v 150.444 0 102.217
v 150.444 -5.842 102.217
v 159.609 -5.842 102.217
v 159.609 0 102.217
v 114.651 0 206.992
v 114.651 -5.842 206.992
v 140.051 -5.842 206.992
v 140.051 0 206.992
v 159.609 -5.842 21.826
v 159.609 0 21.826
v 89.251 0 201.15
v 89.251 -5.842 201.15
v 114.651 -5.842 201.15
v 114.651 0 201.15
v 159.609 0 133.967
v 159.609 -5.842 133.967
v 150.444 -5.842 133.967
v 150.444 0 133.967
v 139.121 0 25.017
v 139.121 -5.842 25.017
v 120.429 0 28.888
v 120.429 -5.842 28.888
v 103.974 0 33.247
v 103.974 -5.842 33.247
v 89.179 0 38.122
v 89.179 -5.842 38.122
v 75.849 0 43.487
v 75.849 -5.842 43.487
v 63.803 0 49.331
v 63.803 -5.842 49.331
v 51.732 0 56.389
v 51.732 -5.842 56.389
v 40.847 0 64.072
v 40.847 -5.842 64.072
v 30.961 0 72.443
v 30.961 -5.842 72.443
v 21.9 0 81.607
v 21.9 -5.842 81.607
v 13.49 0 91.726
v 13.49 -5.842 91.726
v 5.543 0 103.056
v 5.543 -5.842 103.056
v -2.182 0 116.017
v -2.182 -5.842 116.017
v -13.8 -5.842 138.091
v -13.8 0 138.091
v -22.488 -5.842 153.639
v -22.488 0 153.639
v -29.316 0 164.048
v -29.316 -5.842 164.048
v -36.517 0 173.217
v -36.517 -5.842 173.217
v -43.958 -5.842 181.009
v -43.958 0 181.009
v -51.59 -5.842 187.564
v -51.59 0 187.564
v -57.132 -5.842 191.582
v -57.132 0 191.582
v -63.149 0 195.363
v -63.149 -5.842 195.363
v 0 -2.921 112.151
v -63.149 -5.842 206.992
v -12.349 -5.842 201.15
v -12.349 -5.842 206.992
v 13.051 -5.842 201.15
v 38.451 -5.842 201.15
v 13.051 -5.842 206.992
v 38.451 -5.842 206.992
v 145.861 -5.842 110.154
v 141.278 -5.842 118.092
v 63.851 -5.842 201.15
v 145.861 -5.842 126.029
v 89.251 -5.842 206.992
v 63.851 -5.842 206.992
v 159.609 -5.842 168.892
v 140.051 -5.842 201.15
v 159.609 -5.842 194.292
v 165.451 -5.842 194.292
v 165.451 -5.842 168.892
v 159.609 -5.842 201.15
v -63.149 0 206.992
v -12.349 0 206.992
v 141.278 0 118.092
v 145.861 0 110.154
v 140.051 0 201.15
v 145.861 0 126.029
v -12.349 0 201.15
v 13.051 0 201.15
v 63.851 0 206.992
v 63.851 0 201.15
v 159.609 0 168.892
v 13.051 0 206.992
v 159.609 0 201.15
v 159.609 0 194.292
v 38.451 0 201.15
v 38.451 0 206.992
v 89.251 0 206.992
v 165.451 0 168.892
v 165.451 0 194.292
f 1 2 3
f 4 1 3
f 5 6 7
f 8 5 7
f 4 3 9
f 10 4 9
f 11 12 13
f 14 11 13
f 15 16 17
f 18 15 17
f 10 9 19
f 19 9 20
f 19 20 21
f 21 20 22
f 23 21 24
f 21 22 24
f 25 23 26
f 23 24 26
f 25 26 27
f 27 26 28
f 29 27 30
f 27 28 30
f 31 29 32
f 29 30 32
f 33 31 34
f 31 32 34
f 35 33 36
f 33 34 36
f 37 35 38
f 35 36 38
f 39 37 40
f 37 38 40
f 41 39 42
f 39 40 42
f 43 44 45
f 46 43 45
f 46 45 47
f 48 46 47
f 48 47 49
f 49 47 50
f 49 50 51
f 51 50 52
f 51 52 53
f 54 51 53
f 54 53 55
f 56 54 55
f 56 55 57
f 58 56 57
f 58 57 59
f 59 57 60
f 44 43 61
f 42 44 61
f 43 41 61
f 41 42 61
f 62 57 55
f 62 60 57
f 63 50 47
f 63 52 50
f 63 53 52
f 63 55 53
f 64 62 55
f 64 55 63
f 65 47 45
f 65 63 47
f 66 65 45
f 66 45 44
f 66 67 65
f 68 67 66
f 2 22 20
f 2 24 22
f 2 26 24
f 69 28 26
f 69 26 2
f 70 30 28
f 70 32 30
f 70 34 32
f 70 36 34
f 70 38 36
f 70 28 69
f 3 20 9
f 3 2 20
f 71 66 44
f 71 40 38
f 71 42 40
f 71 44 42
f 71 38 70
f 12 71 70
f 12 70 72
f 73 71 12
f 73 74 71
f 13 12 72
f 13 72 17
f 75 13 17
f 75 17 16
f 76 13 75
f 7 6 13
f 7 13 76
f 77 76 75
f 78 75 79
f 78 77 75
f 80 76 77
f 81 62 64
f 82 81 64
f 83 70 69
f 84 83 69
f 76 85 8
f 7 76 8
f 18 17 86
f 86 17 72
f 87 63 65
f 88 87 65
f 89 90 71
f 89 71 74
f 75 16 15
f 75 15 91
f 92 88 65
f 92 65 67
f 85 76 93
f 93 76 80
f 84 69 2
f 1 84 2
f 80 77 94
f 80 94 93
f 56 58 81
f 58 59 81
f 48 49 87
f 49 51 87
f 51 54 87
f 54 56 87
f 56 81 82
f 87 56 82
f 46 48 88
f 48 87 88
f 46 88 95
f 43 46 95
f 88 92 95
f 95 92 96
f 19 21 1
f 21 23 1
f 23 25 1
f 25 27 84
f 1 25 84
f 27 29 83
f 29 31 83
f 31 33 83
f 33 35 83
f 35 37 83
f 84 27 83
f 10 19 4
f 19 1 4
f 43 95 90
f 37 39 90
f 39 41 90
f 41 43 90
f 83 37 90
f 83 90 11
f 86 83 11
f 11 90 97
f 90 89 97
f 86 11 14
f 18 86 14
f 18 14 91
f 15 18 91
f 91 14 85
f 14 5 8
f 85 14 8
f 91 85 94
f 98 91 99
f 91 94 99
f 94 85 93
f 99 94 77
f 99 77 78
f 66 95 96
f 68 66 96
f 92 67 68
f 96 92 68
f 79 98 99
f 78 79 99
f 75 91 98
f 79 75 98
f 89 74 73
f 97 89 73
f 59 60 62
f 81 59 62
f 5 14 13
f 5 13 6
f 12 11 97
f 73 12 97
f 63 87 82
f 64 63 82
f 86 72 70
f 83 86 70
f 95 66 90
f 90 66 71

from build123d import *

# Parameters (mm, degrees)
F0_W      = 279.4
F0_H      = 330.2
F1_DEPTH  = 5.842
F2_W      = 25.4
F2_H      = 5.842
F2_W_2    = 76.2
F2_W_3    = 5.842
F2_H_2    = 25.4
F2_H_3    = 38.1
F3_DEPTH  = 5.842
F5_W      = 5.842
F5_H      = 12.7
F6_DEPTH  = 5.842
F7_DEPTH  = 5.842
F8_W      = 5.842
F8_H      = 25.4
F8_H_2    = 48.641
F8_H_3    = 34.925
F8_H_4    = 11.684
F9_DEPTH  = 5.842
F10_W     = 246.7240431406
F10_H     = 1.016
F11_DEPTH = 5.842
F13_W     = 25.4
F13_H     = 5.842
F13_W_2   = 19.558
F14_DEPTH = 5.842


# Not quite as in the source:
# - a feature names something its author has since deleted; it is built from what else it names


with BuildPart() as f1:
    # F0 (on Front) → F1 (new body)
    with BuildSketch(Plane.XZ):
        with Locations((25.751306051, 40.8756073241)):
            Rectangle(F0_W, F0_H)
    extrude(amount=F1_DEPTH)

    # F2 (on face) → F3 (cut, through all)
    with BuildSketch(Plane.XZ.offset(5.842)):
        with Locations((152.751306051, -121.3033926759)):
            Rectangle(F2_W, F2_H)
        with Locations((101.951306051, -121.3033926759)):
            Rectangle(F2_W, F2_H)
        with Locations((51.151306051, -121.3033926759)):
            Rectangle(F2_W, F2_H)
        with Locations((0.351306051, -121.3033926759)):
            Rectangle(F2_W, F2_H)
        with Locations((-75.848693949, -121.3033926759)):
            Rectangle(F2_W_2, F2_H)
        with Locations((162.530306051, -86.1243926759)):
            Rectangle(F2_W_3, F2_H_2)
        with Locations((162.530306051, -28.9743926759)):
            Rectangle(F2_W_3, F2_H_3)
        with Locations((-111.027693949, -86.1243926759)):
            Rectangle(F2_W_3, F2_H_2)
        with Locations((-111.027693949, -35.3243926759)):
            Rectangle(F2_W_3, F2_H_2)
        with Locations((-111.027693949, 15.4756073241)):
            Rectangle(F2_W_3, F2_H_2)
        with Locations((-111.027693949, 66.2756073241)):
            Rectangle(F2_W_3, F2_H_2)
        with Locations((-111.027693949, 167.8756073241)):
            Rectangle(F2_W_3, F2_H_2)
        with Locations((-111.027693949, 117.0756073241)):
            Rectangle(F2_W_3, F2_H_2)
    extrude(amount=-F3_DEPTH, mode=Mode.SUBTRACT)

    # F5 (on face) → F6 (cut, through all)
    with BuildSketch(Plane.XZ.offset(5.842)):
        with Locations((162.530306051, 2.7756073241)):
            Rectangle(F5_W, F5_H)
    extrude(amount=-F6_DEPTH, mode=Mode.SUBTRACT)

    # F4 (on face) → F7 (cut, through all)
    with BuildSketch(Plane.XZ.offset(5.842)):
        with BuildLine():
            Line((165.451306051, 15.4756073241), (159.609306051, 15.4756073241))
            add(Edge.make_bspline(
                [(159.609306051, 15.4756073241), (73.376306051, 28.1756073241), (-24.3765935073, 60.3637718481), (-21.873693949, 193.2756073241), (-113.948693949, 205.9756073241)],
                knots=[0, 0, 0, 0, 0.507272, 1, 1, 1, 1], degree=3))
            Line((-113.948693949, 205.9756073241), (-113.948693949, 180.5756073241))
            Line((-113.948693949, 180.5756073241), (-108.106693949, 180.5756073241))
            Line((-108.106693949, 180.5756073241), (-108.106693949, 155.1756073241))
            Line((-108.106693949, 155.1756073241), (-113.948693949, 155.1756073241))
            Line((-113.948693949, 155.1756073241), (-113.948693949, 129.7756073241))
            Line((-113.948693949, 129.7756073241), (-108.106693949, 129.7756073241))
            Line((-108.106693949, 129.7756073241), (-108.106693949, 104.3756073241))
            Line((-108.106693949, 104.3756073241), (-113.948693949, 104.3756073241))
            Line((-113.948693949, 104.3756073241), (-113.948693949, 78.9756073241))
            Line((-113.948693949, 78.9756073241), (-108.106693949, 78.9756073241))
            Line((-108.106693949, 78.9756073241), (-108.106693949, 53.5756073241))
            Line((-108.106693949, 53.5756073241), (-113.948693949, 53.5756073241))
            Line((-113.948693949, 53.5756073241), (-113.948693949, 28.1756073241))
            Line((-113.948693949, 28.1756073241), (-108.106693949, 28.1756073241))
            Line((-108.106693949, 28.1756073241), (-108.106693949, 2.7756073241))
            Line((-108.106693949, 2.7756073241), (-113.948693949, 2.7756073241))
            Line((-113.948693949, 2.7756073241), (-113.948693949, -22.6243926759))
            Line((-113.948693949, -22.6243926759), (-108.106693949, -22.6243926759))
            Line((-108.106693949, -22.6243926759), (-108.106693949, -48.0243926759))
            Line((-108.106693949, -48.0243926759), (-113.948693949, -48.0243926759))
            Line((-113.948693949, -48.0243926759), (-113.948693949, -73.4243926759))
            Line((-113.948693949, -73.4243926759), (-108.106693949, -73.4243926759))
            Line((-108.106693949, -73.4243926759), (-108.106693949, -98.8243926759))
            Line((-108.106693949, -98.8243926759), (-113.948693949, -98.8243926759))
            Line((-113.948693949, -98.8243926759), (-113.948693949, -118.3823926759))
            Line((-113.948693949, -118.3823926759), (-37.748693949, -118.3823926759))
            Line((-37.748693949, -118.3823926759), (-37.748693949, -124.2243926759))
            Line((-37.748693949, -124.2243926759), (-12.348693949, -124.2243926759))
            Line((-12.348693949, -124.2243926759), (-12.348693949, -118.3823926759))
            Line((-12.348693949, -118.3823926759), (13.051306051, -118.3823926759))
            Line((13.051306051, -118.3823926759), (13.051306051, -124.2243926759))
            Line((13.051306051, -124.2243926759), (38.451306051, -124.2243926759))
            Line((38.451306051, -124.2243926759), (38.451306051, -118.3823926759))
            Line((38.451306051, -118.3823926759), (63.851306051, -118.3823926759))
            Line((63.851306051, -118.3823926759), (63.851306051, -124.2243926759))
            Line((63.851306051, -124.2243926759), (89.251306051, -124.2243926759))
            Line((89.251306051, -124.2243926759), (89.251306051, -118.3823926759))
            Line((89.251306051, -118.3823926759), (114.651306051, -118.3823926759))
            Line((114.651306051, -118.3823926759), (114.651306051, -124.2243926759))
            Line((114.651306051, -124.2243926759), (140.051306051, -124.2243926759))
            Line((140.051306051, -124.2243926759), (140.051306051, -118.3823926759))
            Line((140.051306051, -118.3823926759), (165.451306051, -118.3823926759))
            Line((165.451306051, -118.3823926759), (165.451306051, -98.8243926759))
            Line((165.451306051, -98.8243926759), (159.609306051, -98.8243926759))
            Line((159.609306051, -98.8243926759), (159.609306051, -73.4243926759))
            Line((159.609306051, -73.4243926759), (165.451306051, -73.4243926759))
            Line((165.451306051, -73.4243926759), (165.451306051, -48.0243926759))
            Line((165.451306051, -48.0243926759), (159.609306051, -48.0243926759))
            Line((159.609306051, -48.0243926759), (159.609306051, -9.9243926759))
            Line((159.609306051, -9.9243926759), (165.451306051, -9.9243926759))
            Line((165.451306051, -9.9243926759), (165.451306051, 15.4756073241))
        make_face()
        with BuildLine():
            add(Edge.make_bspline(
                [(159.609306051, 15.4756073241), (73.376306051, 28.1756073241), (-24.3765935073, 60.3637718481), (-21.873693949, 193.2756073241), (-113.948693949, 205.9756073241)],
                knots=[0, 0, 0, 0, 0.507272, 1, 1, 1, 1], degree=3))
            Line((159.609306051, 15.4756073241), (159.609306051, 21.8256073241))
            add(Edge.make_bspline(
                [(159.609306051, 21.8256073241), (63.851306051, 34.5256073241), (-5.6173037023, 95.4914607938), (-31.4644745687, 187.7697107475), (-87.114737086, 205.9756073241)],
                knots=[0, 0, 0, 0, 0.5236819738, 0.940243193, 0.940243193, 0.940243193, 0.940243193], degree=3))
            Line((-87.114737086, 205.9756073241), (-113.948693949, 205.9756073241))
        make_face()
    extrude(amount=-F7_DEPTH, mode=Mode.SUBTRACT)

    # F8 (on face) → F9 (cut, through all)
    with BuildSketch(Plane.XZ.offset(5.842)):
        Polygon((165.451306051, 15.4756073241), (165.451306051, 28.1756073241), (159.609306051, 28.1756073241), (159.609306051, 21.8256073241), (159.609306051, 15.4756073241), align=None)
        with Locations((162.530306051, 40.8756073241)):
            Rectangle(F8_W, F8_H)
        with Locations((162.530306051, 77.8961073241)):
            Rectangle(F8_W, F8_H_2)
        with BuildLine():
            Line((159.609306051, 102.2166073241), (165.451306051, 102.2166073241))
            Line((165.451306051, 102.2166073241), (165.451306051, 103.3306229057))
            ThreePointArc((165.451306051, 103.3306229057), (162.5829399691, 102.4975980153), (159.609306051, 102.2166073241))
        make_face()
        with BuildLine():
            ThreePointArc((145.861152343, 110.1541080567), (151.6718056847, 104.3434542505), (159.609306051, 102.2166073241))
            Line((159.609306051, 102.2166073241), (159.609306051, 133.9666073241))
            ThreePointArc((159.609306051, 133.9666073241), (151.6718056847, 131.8397603977), (145.861152343, 126.0291065915))
            ThreePointArc((145.861152343, 126.0291065915), (143.734306051, 118.0916073241), (145.861152343, 110.1541080567))
        make_face()
        with BuildLine():
            Line((150.4438705276, 102.2166073241), (159.609306051, 102.2166073241))
            ThreePointArc((159.609306051, 102.2166073241), (151.6718056847, 104.3434542505), (145.861152343, 110.1541080567))
            Line((145.861152343, 110.1541080567), (150.4438705276, 102.2166073241))
        make_face()
        with BuildLine():
            Line((159.609306051, 133.9666073241), (159.609306051, 102.2166073241))
            ThreePointArc((159.609306051, 102.2166073241), (162.5829399691, 102.4975980153), (165.451306051, 103.3306229057))
            Line((165.451306051, 103.3306229057), (165.451306051, 132.8525917425))
            ThreePointArc((165.451306051, 132.8525917425), (162.5829399691, 133.6856166328), (159.609306051, 133.9666073241))
        make_face()
        with BuildLine():
            Line((165.451306051, 133.9666073241), (159.609306051, 133.9666073241))
            ThreePointArc((159.609306051, 133.9666073241), (162.5829399691, 133.6856166328), (165.451306051, 132.8525917425))
            Line((165.451306051, 132.8525917425), (165.451306051, 133.9666073241))
        make_face()
        with BuildLine():
            ThreePointArc((145.861152343, 126.0291065915), (151.6718056847, 131.8397603977), (159.609306051, 133.9666073241))
            Line((159.609306051, 133.9666073241), (150.4438705276, 133.9666073241))
            Line((150.4438705276, 133.9666073241), (145.861152343, 126.0291065915))
        make_face()
        with Locations((162.530306051, 151.4291073241)):
            Rectangle(F8_W, F8_H_3)
        with BuildLine():
            Line((141.2784350042, 118.0916073241), (145.861152343, 110.1541080567))
            ThreePointArc((145.861152343, 110.1541080567), (143.734306051, 118.0916073241), (145.861152343, 126.0291065915))
            Line((145.861152343, 126.0291065915), (141.2784350042, 118.0916073241))
        make_face()
        with Locations((162.530306051, 200.1336073241)):
            Rectangle(F8_W, F8_H_4)
    extrude(amount=-F9_DEPTH, mode=Mode.SUBTRACT)

    # F10 (on face) → F11 (join, through all)
    with BuildSketch(Plane.XZ.offset(5.842)):
        with Locations((36.2472844807, 206.4836073241)):
            Rectangle(F10_W, F10_H)
    extrude(amount=-F11_DEPTH)

    # F13 (on face) → F14 (cut, through all)
    with BuildSketch(Plane.XZ.offset(5.842)):
        with Locations((51.151306051, 204.0706073241)):
            Rectangle(F13_W, F13_H)
        with Locations((101.951306051, 204.0706073241)):
            Rectangle(F13_W, F13_H)
        with Locations((149.830306051, 204.0706073241)):
            Rectangle(F13_W_2, F13_H)
        with BuildLine():
            add(Edge.make_bspline(
                [(-64.0656111495, 195.8912068503), (-64.4986133811, 197.8821506555), (-64.5462177809, 200.9608220943), (-64.8897370896, 206.9916073241)],
                knots=[0.7783755915, 0.7783755915, 0.7783755915, 0.7783755915, 1, 1, 1, 1], degree=3))
            Line((-64.8897370896, 206.9916073241), (-87.1147370896, 206.9916073241))
            Line((-87.1147370896, 206.9916073241), (-87.1147370896, 205.9756073241))
            add(Edge.make_bspline(
                [(-64.0656111419, 195.8912068549), (-70.8038372609, 199.7329606353), (-78.4197996839, 203.1310721158), (-87.114737086, 205.9756073241)],
                knots=[0.8751586172, 0.8751586172, 0.8751586172, 0.8751586172, 0.940243193, 0.940243193, 0.940243193, 0.940243193], degree=3))
        make_face()
        with Locations((0.351306051, 204.0706073241)):
            Rectangle(F13_W, F13_H)
        with BuildLine():
            Line((-63.148693949, 195.362557311), (-63.148693949, 206.9916073241))
            Line((-63.148693949, 206.9916073241), (-64.8897370896, 206.9916073241))
            add(Edge.make_bspline(
                [(-64.0656111495, 195.8912068503), (-64.4986133811, 197.8821506555), (-64.5462177809, 200.9608220943), (-64.8897370896, 206.9916073241)],
                knots=[0.7783755915, 0.7783755915, 0.7783755915, 0.7783755915, 1, 1, 1, 1], degree=3))
            add(Edge.make_bspline(
                [(-63.148693949, 195.362557311), (-63.4525182871, 195.5396905387), (-63.7581509788, 195.7159105346), (-64.0656111419, 195.8912068549)],
                knots=[0.8721888572, 0.8721888572, 0.8721888572, 0.8721888572, 0.8751586172, 0.8751586172, 0.8751586172, 0.8751586172], degree=3))
        make_face()
    extrude(amount=-F14_DEPTH, mode=Mode.SUBTRACT)


solid = f1.part
